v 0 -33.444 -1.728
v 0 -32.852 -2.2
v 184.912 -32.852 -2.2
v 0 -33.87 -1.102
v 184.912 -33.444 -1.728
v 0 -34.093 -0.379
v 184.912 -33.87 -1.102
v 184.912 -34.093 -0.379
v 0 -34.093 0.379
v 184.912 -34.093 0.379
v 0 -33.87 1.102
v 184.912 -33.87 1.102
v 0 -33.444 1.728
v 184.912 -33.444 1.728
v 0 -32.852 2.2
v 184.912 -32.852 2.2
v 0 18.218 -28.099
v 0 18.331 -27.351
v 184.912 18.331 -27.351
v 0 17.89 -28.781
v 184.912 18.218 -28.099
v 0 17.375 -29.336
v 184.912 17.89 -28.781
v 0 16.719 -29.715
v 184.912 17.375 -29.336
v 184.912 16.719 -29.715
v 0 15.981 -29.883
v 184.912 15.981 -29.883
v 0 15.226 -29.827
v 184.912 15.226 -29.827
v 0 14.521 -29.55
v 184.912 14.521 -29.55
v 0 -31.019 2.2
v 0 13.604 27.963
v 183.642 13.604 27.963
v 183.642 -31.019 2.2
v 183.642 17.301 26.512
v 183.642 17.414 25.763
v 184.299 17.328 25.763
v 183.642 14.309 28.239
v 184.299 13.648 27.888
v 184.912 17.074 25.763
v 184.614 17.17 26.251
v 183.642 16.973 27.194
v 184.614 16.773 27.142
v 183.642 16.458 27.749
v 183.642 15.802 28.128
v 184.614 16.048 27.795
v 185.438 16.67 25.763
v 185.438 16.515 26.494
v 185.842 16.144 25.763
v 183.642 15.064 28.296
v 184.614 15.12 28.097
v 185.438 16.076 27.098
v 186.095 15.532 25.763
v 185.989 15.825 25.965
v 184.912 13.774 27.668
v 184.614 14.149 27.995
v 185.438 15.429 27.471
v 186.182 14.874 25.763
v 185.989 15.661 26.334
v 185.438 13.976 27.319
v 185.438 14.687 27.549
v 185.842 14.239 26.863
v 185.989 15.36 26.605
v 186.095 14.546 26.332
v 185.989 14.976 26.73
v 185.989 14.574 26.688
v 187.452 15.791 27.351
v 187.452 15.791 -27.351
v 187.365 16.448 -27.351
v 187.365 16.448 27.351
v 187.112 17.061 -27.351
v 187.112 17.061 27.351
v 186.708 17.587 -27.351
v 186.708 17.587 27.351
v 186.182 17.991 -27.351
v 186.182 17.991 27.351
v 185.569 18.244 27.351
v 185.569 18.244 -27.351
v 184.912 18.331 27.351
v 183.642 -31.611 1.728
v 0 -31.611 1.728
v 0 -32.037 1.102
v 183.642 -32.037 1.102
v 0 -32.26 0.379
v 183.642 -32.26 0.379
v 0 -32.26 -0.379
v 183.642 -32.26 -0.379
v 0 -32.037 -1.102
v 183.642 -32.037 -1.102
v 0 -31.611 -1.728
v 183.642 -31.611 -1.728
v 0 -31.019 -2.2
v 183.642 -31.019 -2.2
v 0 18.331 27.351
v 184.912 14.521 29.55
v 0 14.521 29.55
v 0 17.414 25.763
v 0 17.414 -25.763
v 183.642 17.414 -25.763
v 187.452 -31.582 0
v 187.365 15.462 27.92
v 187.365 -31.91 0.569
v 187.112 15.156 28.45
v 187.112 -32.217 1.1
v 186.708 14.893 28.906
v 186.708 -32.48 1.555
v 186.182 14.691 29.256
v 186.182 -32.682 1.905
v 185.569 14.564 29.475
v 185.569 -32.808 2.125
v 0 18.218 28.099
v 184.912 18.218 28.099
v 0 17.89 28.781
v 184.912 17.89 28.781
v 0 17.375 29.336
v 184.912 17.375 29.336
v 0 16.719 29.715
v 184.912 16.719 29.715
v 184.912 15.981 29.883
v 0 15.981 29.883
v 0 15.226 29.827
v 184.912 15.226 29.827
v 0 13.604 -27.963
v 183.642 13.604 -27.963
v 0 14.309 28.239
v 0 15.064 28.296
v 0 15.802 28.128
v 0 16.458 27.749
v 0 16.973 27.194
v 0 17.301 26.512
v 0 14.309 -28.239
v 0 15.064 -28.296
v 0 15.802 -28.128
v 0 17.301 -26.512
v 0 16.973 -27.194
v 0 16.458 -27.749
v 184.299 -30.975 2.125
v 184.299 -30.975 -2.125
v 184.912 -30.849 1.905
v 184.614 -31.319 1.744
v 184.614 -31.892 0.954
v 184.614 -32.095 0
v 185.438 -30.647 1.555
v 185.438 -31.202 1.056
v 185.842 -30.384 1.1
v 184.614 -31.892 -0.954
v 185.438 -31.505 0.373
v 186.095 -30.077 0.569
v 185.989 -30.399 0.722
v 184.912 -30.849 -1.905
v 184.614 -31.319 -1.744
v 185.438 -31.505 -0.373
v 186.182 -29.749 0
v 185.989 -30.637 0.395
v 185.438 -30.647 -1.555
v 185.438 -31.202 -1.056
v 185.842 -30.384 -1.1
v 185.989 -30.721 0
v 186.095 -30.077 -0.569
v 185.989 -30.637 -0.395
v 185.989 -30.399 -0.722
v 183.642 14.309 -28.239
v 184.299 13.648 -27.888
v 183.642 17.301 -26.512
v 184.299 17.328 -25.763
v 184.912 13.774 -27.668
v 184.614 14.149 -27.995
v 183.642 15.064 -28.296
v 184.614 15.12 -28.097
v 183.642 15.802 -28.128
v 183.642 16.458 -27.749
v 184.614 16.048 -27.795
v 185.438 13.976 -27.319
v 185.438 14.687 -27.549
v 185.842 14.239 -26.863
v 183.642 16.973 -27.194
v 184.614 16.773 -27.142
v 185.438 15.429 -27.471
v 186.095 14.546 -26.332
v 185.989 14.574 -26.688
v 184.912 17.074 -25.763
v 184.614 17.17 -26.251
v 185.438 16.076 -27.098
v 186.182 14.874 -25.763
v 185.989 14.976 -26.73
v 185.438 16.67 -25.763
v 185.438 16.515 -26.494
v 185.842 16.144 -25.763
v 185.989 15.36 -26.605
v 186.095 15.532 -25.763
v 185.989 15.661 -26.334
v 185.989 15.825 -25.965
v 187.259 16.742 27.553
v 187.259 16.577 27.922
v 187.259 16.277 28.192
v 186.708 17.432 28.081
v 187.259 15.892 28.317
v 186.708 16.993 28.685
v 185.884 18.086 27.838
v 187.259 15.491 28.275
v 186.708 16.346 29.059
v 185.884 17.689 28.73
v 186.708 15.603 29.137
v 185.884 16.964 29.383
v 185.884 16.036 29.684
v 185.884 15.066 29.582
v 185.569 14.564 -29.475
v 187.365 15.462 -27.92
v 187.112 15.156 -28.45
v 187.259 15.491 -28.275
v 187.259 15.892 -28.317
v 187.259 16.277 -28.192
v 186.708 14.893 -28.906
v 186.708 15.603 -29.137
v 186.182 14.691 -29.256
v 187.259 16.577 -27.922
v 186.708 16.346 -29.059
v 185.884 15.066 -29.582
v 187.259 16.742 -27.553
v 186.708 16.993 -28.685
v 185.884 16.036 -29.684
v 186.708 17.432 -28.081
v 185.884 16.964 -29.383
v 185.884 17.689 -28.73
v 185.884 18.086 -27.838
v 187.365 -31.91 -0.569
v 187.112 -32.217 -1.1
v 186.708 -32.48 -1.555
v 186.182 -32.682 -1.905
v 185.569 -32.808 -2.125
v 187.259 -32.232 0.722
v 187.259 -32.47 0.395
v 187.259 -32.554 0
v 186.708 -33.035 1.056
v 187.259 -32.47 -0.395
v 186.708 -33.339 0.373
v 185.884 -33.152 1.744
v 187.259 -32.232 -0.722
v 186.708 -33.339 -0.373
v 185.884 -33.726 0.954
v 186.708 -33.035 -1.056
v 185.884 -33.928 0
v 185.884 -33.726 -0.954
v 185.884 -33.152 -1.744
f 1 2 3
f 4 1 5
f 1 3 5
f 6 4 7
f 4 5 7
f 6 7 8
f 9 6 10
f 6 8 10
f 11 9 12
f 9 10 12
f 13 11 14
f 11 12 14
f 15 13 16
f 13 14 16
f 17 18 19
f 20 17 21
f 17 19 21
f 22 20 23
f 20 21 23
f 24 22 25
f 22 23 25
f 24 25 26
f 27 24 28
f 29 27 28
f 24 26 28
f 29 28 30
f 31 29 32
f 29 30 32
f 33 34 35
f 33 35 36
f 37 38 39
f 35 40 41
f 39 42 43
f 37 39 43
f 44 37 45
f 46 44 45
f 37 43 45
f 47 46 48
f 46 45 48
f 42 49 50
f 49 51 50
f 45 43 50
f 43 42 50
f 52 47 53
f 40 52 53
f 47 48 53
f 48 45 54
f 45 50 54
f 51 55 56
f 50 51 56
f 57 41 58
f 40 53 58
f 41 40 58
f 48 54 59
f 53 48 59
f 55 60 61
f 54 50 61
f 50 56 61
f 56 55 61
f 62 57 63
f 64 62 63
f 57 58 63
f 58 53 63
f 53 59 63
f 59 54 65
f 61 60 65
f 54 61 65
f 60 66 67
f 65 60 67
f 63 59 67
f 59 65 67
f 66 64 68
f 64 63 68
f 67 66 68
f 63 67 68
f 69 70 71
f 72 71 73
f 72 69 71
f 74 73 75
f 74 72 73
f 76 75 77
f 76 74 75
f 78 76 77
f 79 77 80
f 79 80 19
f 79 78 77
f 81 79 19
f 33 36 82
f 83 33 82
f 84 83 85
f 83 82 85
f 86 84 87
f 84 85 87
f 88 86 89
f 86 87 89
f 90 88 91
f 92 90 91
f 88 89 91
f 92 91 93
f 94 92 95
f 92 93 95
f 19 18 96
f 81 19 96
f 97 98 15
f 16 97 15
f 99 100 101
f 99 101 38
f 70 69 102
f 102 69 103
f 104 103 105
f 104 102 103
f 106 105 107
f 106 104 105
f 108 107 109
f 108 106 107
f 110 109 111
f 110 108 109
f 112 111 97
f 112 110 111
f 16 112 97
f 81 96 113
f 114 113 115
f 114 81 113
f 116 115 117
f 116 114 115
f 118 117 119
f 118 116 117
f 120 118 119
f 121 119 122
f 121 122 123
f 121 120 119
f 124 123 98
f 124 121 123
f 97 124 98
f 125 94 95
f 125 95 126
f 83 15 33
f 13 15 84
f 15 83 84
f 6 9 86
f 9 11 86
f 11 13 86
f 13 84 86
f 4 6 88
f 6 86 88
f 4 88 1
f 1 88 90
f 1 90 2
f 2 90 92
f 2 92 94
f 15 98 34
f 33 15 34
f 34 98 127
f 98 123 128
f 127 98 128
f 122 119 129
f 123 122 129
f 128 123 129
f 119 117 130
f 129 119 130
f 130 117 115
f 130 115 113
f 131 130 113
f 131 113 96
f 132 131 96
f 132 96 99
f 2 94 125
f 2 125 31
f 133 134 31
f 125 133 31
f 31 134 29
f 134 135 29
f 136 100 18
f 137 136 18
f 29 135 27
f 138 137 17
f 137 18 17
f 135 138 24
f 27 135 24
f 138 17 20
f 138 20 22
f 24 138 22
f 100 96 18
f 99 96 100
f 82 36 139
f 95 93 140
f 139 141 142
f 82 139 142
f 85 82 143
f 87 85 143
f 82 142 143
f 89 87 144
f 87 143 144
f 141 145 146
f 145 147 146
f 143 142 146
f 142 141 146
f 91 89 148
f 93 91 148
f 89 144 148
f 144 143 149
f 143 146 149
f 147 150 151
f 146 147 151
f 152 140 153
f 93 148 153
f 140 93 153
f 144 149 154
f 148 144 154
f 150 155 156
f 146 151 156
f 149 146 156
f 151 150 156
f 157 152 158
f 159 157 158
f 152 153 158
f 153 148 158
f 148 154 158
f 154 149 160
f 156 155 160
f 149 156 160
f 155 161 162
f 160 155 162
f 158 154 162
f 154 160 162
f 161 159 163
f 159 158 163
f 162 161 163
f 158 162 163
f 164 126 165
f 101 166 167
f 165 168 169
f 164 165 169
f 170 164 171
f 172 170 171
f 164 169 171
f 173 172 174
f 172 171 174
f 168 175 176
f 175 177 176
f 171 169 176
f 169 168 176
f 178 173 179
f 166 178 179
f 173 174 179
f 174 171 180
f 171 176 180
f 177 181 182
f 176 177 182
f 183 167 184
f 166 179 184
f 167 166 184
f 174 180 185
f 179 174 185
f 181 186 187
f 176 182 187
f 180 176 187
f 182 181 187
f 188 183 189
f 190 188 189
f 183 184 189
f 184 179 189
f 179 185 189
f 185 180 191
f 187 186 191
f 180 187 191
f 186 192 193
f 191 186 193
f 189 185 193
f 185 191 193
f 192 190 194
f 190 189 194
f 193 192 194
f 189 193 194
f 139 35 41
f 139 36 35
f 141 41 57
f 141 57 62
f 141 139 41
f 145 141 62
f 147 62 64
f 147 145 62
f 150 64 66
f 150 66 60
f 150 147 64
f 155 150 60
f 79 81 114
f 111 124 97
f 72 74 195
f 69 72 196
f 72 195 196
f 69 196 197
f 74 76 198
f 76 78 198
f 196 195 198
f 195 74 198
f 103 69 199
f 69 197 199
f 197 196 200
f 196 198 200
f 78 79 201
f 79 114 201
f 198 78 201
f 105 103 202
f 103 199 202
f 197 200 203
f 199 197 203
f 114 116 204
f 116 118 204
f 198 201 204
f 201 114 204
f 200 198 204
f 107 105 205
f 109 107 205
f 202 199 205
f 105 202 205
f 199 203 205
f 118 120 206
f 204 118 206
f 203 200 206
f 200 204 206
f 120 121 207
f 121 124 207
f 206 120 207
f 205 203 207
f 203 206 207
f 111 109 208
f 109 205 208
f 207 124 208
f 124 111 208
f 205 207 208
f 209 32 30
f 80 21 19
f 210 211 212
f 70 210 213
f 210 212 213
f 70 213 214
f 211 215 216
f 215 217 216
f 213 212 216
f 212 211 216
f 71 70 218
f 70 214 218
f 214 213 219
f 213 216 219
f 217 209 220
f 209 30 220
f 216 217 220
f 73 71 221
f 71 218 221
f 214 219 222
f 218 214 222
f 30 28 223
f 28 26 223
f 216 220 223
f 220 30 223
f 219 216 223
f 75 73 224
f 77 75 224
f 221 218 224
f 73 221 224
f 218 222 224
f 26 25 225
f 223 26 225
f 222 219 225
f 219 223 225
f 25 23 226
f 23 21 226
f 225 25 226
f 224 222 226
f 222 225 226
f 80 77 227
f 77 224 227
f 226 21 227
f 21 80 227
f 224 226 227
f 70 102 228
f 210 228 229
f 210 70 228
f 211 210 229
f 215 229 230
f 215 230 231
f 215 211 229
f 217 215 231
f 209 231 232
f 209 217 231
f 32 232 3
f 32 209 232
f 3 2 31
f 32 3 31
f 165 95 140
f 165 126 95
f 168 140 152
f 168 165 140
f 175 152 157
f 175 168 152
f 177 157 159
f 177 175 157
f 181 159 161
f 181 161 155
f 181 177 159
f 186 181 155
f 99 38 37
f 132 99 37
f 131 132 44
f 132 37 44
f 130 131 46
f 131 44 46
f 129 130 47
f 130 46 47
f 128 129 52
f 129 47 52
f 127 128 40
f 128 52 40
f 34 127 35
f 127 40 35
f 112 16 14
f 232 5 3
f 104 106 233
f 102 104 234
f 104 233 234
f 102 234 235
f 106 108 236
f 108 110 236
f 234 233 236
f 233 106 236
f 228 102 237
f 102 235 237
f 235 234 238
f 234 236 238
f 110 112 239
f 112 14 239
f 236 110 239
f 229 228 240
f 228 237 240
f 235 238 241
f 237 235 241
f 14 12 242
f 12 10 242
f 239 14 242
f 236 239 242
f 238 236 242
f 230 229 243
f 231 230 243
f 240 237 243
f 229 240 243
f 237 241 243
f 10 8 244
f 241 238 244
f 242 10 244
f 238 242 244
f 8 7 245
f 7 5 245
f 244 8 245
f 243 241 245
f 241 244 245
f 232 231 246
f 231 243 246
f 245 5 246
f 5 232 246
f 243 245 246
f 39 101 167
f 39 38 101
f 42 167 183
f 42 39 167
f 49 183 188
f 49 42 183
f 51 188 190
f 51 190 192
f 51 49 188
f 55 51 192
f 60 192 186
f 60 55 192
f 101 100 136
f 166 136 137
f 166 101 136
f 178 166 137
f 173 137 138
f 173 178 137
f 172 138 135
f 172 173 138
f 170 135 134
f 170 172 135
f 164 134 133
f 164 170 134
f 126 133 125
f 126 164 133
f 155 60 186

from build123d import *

# Parameters (mm, degrees)
BOSS_EXTRUDE2_DEPTH = 187.452
CUT_EXTRUDE1_DEPTH  = 186.182
FILLET1_R           = 2.54
FILLET2_R           = 2.54


with BuildPart() as part:
    # Sketch2 → Boss-Extrude2 (new body)
    with BuildSketch(Plane(origin=(0, 0, 0), x_dir=(0, 0, -1), z_dir=(1, 0, 0))):
        Polygon((31.75, 18.330871047), (-31.75, 18.330871047), (0, -36.661742094), align=None)
    extrude(amount=BOSS_EXTRUDE2_DEPTH)

    # Sketch3 → Cut-Extrude1 (cut)
    with BuildSketch(Plane(origin=(0, 0, 0), x_dir=(0, 0, -1), z_dir=(1, 0, 0))):
        Polygon((30.1625, 17.414327494), (-30.1625, 17.414327494), (0, -34.828654989), align=None)
    extrude(amount=CUT_EXTRUDE1_DEPTH, mode=Mode.SUBTRACT)

    # Fillet1
    fillet1_edges = [part.edges().sort_by_distance(p)[0] for p in [
        (93.091, -34.828654989, 0),
        (93.091, 17.414327494, -30.1625),
        (93.091, 17.414327494, 30.1625),
        (93.726, -36.661742094, 0),
        (93.726, 18.330871047, 31.75),
        (93.726, 18.330871047, -31.75),
    ]]
    fillet(fillet1_edges, radius=FILLET1_R)

    # Fillet2
    fillet2_edges = [part.edges().sort_by_distance(p)[0] for p in [
        (186.182, -8.707163747, 15.08125),
        (186.182, -8.707163747, -15.08125),
        (186.182, 17.414327494, 0),
        (186.182, 16.144327494, -27.962795474),
        (186.182, 16.144327494, 27.962795474),
        (186.182, -32.288654989, 0),
        (187.452, -9.165435523, -15.875),
        (187.452, -9.165435523, 15.875),
        (187.452, 18.330871047, 0),
        (187.452, 17.060871047, -29.550295474),
        (187.452, 17.060871047, 29.550295474),
        (187.452, -34.121742094, 0),
    ]]
    fillet(fillet2_edges, radius=FILLET2_R)


solid = part.part
